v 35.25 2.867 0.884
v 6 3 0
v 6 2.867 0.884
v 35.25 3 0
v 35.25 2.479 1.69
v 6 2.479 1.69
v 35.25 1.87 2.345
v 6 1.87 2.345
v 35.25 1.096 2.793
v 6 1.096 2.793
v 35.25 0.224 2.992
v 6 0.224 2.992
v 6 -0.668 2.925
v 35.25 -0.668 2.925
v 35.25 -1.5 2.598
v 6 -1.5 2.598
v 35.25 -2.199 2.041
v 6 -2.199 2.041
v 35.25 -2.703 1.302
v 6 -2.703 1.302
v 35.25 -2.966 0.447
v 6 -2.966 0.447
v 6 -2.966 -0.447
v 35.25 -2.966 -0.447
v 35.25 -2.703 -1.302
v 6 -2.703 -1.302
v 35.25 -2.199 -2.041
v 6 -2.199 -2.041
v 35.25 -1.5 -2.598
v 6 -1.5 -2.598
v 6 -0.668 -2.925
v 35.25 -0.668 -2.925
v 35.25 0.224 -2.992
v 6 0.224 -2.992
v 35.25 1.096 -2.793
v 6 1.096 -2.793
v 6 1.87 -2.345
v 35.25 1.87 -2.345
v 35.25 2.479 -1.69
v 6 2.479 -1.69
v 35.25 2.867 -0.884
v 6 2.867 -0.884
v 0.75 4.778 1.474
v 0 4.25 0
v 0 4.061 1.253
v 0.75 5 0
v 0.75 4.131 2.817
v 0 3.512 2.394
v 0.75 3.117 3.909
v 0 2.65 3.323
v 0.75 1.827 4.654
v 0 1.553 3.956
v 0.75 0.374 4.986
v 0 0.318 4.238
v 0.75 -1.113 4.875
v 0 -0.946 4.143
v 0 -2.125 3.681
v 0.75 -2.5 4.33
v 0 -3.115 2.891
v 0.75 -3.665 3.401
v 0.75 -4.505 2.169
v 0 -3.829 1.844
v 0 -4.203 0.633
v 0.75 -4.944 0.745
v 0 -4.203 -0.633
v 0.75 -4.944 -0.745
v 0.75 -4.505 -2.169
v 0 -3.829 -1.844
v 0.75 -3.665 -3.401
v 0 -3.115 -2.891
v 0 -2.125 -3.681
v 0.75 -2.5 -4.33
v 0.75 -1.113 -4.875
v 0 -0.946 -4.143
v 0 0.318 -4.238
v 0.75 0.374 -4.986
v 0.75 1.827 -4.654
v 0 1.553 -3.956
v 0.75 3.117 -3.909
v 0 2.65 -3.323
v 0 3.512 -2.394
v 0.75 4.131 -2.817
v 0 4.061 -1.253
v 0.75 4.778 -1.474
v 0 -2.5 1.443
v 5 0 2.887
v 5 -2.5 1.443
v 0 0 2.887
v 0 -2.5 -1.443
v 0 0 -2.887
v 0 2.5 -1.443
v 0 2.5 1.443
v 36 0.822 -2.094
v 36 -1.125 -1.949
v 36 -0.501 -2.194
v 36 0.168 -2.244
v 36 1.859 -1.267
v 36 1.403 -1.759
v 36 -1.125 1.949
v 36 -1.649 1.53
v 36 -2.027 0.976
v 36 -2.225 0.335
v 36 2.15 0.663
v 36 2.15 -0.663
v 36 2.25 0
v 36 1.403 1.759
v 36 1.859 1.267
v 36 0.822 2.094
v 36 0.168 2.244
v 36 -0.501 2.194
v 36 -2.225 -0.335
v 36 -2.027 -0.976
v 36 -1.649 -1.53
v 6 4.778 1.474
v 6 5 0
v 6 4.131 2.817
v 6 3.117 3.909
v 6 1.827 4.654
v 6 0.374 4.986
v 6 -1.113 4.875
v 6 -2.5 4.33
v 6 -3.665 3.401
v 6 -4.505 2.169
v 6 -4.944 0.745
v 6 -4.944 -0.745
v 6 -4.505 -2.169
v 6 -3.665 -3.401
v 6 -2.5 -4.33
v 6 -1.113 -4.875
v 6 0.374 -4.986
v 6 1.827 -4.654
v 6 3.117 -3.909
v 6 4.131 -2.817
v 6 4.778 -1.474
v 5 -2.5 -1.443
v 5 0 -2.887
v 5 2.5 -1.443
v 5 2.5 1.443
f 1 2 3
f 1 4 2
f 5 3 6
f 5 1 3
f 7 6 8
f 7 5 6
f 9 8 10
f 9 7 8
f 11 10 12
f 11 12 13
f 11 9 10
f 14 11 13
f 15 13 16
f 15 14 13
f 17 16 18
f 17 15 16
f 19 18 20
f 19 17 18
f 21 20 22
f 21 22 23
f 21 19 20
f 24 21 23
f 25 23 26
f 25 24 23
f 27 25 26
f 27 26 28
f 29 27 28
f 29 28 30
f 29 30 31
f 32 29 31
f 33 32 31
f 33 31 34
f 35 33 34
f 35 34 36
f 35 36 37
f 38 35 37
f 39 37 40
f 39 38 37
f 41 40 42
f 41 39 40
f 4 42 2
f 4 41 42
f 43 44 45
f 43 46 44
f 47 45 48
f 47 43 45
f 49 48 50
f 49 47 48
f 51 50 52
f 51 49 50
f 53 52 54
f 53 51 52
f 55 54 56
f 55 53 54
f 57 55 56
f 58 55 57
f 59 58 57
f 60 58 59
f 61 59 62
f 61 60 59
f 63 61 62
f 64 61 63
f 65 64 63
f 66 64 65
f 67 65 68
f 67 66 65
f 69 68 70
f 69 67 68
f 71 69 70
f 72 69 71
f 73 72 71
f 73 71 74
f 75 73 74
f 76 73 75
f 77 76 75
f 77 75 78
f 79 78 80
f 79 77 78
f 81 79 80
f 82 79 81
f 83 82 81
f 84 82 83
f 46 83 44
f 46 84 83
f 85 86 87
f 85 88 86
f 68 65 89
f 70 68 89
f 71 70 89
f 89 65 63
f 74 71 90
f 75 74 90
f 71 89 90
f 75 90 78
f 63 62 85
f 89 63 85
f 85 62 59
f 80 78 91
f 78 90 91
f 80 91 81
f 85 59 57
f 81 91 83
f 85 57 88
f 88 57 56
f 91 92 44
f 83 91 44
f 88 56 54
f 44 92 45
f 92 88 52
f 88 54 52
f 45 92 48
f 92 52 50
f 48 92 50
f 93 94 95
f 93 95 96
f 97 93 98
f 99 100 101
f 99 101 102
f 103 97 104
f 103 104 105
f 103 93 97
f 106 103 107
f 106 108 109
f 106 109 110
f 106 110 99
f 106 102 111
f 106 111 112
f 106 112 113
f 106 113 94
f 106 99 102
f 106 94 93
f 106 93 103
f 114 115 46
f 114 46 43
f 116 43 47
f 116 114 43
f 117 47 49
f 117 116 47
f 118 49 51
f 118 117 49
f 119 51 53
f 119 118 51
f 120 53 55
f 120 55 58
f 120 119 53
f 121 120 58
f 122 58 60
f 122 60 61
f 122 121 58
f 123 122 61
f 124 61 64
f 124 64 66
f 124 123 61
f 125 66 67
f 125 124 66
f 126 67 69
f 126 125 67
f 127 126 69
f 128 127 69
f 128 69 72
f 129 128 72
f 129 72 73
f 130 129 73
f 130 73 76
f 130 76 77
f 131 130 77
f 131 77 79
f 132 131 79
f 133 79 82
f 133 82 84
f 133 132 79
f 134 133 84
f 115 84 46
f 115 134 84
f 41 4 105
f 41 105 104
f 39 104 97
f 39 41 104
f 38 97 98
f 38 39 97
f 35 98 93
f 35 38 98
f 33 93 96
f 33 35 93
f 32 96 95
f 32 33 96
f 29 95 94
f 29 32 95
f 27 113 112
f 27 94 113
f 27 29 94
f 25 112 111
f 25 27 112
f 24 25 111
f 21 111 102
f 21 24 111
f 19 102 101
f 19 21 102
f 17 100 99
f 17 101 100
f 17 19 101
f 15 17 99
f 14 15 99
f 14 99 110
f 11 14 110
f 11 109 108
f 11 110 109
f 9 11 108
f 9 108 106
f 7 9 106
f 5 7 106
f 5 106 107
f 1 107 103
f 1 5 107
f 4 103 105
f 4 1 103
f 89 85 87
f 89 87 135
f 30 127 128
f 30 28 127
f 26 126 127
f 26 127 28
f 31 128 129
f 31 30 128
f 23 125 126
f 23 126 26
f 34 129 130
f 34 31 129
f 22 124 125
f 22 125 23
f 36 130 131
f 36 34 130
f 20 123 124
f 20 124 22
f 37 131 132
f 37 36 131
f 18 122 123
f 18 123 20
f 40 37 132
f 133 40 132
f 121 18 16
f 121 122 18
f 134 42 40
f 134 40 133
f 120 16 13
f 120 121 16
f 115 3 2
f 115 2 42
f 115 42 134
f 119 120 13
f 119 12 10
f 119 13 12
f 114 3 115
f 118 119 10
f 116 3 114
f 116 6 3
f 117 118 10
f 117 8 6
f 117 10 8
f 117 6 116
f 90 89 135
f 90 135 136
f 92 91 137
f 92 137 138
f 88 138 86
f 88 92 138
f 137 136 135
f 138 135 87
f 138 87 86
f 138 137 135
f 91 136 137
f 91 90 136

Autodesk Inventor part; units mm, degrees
ref_plane "YZ Plane" through (0, 0, 0) normal (1, 0, 0) x (0, 1, 0)
ref_plane "XZ Plane" through (0, 0, 0) normal (0, 1, 0) x (-1, 0, 0)
ref_plane "XY Plane" through (0, 0, 0) normal (0, 0, 1) x (1, 0, 0)
sketch "Sketch1" plane through (0, 0, 0) normal (0, 0, 1) x (1, 0, 0)
  line L0 (0, 6) -> (0, -1) projected
  line L1 (-7.2, 0) -> (43.2, 0) projected
  line L2 (0, 5) -> (6, 5)
  line L3 (6, 5) -> (6, 3)
  line L4 (6, 3) -> (36, 3)
  line L5 (36, 3) -> (36, 0)
  line L6 (0, 0) -> (36, 0)
  line L7 (0, 5) -> (0, 0)
  dimension "d0" = 30
  dimension "d1" = 10
  dimension "d2" = 6
  dimension "d3" = 6
revolve "Revolution1" add sketch "Sketch1" angle 360 about axis through (0, 0, 0) along (1, 0, 0)
sketch "Sketch2" plane through (0, 0, 0) normal (-1, 0, 0) x (0, 0, 1)
  line L0 (-7, 0) -> (7, 0) projected
  line L1 (0, 7) -> (0, -7) projected
  line L2 (1.4434, -2.5) -> (-1.4434, -2.5)
  line L3 (-1.4434, -2.5) -> (-2.8868, 0)
  line L4 (-2.8868, 0) -> (-1.4434, 2.5)
  line L5 (-1.4434, 2.5) -> (1.4434, 2.5)
  line L6 (1.4434, 2.5) -> (2.8868, 0)
  line L7 (2.8868, 0) -> (1.4434, -2.5)
  point P0 (0, 0)
  point P1 (0, 0)
  dimension "d5" = 5
extrude "Extrusion1" cut sketch "Sketch2" against normal blind 5
thread "Thread1" size "M6x1" class "6g" standard "ANSI Metric M Profile" full length
chamfer "Chamfer1" distance 0.75 angle 45 2 edges at (0, -5, 0) (36, -3, 0)
properties part number "M6x30" material "Stainless Steel"
